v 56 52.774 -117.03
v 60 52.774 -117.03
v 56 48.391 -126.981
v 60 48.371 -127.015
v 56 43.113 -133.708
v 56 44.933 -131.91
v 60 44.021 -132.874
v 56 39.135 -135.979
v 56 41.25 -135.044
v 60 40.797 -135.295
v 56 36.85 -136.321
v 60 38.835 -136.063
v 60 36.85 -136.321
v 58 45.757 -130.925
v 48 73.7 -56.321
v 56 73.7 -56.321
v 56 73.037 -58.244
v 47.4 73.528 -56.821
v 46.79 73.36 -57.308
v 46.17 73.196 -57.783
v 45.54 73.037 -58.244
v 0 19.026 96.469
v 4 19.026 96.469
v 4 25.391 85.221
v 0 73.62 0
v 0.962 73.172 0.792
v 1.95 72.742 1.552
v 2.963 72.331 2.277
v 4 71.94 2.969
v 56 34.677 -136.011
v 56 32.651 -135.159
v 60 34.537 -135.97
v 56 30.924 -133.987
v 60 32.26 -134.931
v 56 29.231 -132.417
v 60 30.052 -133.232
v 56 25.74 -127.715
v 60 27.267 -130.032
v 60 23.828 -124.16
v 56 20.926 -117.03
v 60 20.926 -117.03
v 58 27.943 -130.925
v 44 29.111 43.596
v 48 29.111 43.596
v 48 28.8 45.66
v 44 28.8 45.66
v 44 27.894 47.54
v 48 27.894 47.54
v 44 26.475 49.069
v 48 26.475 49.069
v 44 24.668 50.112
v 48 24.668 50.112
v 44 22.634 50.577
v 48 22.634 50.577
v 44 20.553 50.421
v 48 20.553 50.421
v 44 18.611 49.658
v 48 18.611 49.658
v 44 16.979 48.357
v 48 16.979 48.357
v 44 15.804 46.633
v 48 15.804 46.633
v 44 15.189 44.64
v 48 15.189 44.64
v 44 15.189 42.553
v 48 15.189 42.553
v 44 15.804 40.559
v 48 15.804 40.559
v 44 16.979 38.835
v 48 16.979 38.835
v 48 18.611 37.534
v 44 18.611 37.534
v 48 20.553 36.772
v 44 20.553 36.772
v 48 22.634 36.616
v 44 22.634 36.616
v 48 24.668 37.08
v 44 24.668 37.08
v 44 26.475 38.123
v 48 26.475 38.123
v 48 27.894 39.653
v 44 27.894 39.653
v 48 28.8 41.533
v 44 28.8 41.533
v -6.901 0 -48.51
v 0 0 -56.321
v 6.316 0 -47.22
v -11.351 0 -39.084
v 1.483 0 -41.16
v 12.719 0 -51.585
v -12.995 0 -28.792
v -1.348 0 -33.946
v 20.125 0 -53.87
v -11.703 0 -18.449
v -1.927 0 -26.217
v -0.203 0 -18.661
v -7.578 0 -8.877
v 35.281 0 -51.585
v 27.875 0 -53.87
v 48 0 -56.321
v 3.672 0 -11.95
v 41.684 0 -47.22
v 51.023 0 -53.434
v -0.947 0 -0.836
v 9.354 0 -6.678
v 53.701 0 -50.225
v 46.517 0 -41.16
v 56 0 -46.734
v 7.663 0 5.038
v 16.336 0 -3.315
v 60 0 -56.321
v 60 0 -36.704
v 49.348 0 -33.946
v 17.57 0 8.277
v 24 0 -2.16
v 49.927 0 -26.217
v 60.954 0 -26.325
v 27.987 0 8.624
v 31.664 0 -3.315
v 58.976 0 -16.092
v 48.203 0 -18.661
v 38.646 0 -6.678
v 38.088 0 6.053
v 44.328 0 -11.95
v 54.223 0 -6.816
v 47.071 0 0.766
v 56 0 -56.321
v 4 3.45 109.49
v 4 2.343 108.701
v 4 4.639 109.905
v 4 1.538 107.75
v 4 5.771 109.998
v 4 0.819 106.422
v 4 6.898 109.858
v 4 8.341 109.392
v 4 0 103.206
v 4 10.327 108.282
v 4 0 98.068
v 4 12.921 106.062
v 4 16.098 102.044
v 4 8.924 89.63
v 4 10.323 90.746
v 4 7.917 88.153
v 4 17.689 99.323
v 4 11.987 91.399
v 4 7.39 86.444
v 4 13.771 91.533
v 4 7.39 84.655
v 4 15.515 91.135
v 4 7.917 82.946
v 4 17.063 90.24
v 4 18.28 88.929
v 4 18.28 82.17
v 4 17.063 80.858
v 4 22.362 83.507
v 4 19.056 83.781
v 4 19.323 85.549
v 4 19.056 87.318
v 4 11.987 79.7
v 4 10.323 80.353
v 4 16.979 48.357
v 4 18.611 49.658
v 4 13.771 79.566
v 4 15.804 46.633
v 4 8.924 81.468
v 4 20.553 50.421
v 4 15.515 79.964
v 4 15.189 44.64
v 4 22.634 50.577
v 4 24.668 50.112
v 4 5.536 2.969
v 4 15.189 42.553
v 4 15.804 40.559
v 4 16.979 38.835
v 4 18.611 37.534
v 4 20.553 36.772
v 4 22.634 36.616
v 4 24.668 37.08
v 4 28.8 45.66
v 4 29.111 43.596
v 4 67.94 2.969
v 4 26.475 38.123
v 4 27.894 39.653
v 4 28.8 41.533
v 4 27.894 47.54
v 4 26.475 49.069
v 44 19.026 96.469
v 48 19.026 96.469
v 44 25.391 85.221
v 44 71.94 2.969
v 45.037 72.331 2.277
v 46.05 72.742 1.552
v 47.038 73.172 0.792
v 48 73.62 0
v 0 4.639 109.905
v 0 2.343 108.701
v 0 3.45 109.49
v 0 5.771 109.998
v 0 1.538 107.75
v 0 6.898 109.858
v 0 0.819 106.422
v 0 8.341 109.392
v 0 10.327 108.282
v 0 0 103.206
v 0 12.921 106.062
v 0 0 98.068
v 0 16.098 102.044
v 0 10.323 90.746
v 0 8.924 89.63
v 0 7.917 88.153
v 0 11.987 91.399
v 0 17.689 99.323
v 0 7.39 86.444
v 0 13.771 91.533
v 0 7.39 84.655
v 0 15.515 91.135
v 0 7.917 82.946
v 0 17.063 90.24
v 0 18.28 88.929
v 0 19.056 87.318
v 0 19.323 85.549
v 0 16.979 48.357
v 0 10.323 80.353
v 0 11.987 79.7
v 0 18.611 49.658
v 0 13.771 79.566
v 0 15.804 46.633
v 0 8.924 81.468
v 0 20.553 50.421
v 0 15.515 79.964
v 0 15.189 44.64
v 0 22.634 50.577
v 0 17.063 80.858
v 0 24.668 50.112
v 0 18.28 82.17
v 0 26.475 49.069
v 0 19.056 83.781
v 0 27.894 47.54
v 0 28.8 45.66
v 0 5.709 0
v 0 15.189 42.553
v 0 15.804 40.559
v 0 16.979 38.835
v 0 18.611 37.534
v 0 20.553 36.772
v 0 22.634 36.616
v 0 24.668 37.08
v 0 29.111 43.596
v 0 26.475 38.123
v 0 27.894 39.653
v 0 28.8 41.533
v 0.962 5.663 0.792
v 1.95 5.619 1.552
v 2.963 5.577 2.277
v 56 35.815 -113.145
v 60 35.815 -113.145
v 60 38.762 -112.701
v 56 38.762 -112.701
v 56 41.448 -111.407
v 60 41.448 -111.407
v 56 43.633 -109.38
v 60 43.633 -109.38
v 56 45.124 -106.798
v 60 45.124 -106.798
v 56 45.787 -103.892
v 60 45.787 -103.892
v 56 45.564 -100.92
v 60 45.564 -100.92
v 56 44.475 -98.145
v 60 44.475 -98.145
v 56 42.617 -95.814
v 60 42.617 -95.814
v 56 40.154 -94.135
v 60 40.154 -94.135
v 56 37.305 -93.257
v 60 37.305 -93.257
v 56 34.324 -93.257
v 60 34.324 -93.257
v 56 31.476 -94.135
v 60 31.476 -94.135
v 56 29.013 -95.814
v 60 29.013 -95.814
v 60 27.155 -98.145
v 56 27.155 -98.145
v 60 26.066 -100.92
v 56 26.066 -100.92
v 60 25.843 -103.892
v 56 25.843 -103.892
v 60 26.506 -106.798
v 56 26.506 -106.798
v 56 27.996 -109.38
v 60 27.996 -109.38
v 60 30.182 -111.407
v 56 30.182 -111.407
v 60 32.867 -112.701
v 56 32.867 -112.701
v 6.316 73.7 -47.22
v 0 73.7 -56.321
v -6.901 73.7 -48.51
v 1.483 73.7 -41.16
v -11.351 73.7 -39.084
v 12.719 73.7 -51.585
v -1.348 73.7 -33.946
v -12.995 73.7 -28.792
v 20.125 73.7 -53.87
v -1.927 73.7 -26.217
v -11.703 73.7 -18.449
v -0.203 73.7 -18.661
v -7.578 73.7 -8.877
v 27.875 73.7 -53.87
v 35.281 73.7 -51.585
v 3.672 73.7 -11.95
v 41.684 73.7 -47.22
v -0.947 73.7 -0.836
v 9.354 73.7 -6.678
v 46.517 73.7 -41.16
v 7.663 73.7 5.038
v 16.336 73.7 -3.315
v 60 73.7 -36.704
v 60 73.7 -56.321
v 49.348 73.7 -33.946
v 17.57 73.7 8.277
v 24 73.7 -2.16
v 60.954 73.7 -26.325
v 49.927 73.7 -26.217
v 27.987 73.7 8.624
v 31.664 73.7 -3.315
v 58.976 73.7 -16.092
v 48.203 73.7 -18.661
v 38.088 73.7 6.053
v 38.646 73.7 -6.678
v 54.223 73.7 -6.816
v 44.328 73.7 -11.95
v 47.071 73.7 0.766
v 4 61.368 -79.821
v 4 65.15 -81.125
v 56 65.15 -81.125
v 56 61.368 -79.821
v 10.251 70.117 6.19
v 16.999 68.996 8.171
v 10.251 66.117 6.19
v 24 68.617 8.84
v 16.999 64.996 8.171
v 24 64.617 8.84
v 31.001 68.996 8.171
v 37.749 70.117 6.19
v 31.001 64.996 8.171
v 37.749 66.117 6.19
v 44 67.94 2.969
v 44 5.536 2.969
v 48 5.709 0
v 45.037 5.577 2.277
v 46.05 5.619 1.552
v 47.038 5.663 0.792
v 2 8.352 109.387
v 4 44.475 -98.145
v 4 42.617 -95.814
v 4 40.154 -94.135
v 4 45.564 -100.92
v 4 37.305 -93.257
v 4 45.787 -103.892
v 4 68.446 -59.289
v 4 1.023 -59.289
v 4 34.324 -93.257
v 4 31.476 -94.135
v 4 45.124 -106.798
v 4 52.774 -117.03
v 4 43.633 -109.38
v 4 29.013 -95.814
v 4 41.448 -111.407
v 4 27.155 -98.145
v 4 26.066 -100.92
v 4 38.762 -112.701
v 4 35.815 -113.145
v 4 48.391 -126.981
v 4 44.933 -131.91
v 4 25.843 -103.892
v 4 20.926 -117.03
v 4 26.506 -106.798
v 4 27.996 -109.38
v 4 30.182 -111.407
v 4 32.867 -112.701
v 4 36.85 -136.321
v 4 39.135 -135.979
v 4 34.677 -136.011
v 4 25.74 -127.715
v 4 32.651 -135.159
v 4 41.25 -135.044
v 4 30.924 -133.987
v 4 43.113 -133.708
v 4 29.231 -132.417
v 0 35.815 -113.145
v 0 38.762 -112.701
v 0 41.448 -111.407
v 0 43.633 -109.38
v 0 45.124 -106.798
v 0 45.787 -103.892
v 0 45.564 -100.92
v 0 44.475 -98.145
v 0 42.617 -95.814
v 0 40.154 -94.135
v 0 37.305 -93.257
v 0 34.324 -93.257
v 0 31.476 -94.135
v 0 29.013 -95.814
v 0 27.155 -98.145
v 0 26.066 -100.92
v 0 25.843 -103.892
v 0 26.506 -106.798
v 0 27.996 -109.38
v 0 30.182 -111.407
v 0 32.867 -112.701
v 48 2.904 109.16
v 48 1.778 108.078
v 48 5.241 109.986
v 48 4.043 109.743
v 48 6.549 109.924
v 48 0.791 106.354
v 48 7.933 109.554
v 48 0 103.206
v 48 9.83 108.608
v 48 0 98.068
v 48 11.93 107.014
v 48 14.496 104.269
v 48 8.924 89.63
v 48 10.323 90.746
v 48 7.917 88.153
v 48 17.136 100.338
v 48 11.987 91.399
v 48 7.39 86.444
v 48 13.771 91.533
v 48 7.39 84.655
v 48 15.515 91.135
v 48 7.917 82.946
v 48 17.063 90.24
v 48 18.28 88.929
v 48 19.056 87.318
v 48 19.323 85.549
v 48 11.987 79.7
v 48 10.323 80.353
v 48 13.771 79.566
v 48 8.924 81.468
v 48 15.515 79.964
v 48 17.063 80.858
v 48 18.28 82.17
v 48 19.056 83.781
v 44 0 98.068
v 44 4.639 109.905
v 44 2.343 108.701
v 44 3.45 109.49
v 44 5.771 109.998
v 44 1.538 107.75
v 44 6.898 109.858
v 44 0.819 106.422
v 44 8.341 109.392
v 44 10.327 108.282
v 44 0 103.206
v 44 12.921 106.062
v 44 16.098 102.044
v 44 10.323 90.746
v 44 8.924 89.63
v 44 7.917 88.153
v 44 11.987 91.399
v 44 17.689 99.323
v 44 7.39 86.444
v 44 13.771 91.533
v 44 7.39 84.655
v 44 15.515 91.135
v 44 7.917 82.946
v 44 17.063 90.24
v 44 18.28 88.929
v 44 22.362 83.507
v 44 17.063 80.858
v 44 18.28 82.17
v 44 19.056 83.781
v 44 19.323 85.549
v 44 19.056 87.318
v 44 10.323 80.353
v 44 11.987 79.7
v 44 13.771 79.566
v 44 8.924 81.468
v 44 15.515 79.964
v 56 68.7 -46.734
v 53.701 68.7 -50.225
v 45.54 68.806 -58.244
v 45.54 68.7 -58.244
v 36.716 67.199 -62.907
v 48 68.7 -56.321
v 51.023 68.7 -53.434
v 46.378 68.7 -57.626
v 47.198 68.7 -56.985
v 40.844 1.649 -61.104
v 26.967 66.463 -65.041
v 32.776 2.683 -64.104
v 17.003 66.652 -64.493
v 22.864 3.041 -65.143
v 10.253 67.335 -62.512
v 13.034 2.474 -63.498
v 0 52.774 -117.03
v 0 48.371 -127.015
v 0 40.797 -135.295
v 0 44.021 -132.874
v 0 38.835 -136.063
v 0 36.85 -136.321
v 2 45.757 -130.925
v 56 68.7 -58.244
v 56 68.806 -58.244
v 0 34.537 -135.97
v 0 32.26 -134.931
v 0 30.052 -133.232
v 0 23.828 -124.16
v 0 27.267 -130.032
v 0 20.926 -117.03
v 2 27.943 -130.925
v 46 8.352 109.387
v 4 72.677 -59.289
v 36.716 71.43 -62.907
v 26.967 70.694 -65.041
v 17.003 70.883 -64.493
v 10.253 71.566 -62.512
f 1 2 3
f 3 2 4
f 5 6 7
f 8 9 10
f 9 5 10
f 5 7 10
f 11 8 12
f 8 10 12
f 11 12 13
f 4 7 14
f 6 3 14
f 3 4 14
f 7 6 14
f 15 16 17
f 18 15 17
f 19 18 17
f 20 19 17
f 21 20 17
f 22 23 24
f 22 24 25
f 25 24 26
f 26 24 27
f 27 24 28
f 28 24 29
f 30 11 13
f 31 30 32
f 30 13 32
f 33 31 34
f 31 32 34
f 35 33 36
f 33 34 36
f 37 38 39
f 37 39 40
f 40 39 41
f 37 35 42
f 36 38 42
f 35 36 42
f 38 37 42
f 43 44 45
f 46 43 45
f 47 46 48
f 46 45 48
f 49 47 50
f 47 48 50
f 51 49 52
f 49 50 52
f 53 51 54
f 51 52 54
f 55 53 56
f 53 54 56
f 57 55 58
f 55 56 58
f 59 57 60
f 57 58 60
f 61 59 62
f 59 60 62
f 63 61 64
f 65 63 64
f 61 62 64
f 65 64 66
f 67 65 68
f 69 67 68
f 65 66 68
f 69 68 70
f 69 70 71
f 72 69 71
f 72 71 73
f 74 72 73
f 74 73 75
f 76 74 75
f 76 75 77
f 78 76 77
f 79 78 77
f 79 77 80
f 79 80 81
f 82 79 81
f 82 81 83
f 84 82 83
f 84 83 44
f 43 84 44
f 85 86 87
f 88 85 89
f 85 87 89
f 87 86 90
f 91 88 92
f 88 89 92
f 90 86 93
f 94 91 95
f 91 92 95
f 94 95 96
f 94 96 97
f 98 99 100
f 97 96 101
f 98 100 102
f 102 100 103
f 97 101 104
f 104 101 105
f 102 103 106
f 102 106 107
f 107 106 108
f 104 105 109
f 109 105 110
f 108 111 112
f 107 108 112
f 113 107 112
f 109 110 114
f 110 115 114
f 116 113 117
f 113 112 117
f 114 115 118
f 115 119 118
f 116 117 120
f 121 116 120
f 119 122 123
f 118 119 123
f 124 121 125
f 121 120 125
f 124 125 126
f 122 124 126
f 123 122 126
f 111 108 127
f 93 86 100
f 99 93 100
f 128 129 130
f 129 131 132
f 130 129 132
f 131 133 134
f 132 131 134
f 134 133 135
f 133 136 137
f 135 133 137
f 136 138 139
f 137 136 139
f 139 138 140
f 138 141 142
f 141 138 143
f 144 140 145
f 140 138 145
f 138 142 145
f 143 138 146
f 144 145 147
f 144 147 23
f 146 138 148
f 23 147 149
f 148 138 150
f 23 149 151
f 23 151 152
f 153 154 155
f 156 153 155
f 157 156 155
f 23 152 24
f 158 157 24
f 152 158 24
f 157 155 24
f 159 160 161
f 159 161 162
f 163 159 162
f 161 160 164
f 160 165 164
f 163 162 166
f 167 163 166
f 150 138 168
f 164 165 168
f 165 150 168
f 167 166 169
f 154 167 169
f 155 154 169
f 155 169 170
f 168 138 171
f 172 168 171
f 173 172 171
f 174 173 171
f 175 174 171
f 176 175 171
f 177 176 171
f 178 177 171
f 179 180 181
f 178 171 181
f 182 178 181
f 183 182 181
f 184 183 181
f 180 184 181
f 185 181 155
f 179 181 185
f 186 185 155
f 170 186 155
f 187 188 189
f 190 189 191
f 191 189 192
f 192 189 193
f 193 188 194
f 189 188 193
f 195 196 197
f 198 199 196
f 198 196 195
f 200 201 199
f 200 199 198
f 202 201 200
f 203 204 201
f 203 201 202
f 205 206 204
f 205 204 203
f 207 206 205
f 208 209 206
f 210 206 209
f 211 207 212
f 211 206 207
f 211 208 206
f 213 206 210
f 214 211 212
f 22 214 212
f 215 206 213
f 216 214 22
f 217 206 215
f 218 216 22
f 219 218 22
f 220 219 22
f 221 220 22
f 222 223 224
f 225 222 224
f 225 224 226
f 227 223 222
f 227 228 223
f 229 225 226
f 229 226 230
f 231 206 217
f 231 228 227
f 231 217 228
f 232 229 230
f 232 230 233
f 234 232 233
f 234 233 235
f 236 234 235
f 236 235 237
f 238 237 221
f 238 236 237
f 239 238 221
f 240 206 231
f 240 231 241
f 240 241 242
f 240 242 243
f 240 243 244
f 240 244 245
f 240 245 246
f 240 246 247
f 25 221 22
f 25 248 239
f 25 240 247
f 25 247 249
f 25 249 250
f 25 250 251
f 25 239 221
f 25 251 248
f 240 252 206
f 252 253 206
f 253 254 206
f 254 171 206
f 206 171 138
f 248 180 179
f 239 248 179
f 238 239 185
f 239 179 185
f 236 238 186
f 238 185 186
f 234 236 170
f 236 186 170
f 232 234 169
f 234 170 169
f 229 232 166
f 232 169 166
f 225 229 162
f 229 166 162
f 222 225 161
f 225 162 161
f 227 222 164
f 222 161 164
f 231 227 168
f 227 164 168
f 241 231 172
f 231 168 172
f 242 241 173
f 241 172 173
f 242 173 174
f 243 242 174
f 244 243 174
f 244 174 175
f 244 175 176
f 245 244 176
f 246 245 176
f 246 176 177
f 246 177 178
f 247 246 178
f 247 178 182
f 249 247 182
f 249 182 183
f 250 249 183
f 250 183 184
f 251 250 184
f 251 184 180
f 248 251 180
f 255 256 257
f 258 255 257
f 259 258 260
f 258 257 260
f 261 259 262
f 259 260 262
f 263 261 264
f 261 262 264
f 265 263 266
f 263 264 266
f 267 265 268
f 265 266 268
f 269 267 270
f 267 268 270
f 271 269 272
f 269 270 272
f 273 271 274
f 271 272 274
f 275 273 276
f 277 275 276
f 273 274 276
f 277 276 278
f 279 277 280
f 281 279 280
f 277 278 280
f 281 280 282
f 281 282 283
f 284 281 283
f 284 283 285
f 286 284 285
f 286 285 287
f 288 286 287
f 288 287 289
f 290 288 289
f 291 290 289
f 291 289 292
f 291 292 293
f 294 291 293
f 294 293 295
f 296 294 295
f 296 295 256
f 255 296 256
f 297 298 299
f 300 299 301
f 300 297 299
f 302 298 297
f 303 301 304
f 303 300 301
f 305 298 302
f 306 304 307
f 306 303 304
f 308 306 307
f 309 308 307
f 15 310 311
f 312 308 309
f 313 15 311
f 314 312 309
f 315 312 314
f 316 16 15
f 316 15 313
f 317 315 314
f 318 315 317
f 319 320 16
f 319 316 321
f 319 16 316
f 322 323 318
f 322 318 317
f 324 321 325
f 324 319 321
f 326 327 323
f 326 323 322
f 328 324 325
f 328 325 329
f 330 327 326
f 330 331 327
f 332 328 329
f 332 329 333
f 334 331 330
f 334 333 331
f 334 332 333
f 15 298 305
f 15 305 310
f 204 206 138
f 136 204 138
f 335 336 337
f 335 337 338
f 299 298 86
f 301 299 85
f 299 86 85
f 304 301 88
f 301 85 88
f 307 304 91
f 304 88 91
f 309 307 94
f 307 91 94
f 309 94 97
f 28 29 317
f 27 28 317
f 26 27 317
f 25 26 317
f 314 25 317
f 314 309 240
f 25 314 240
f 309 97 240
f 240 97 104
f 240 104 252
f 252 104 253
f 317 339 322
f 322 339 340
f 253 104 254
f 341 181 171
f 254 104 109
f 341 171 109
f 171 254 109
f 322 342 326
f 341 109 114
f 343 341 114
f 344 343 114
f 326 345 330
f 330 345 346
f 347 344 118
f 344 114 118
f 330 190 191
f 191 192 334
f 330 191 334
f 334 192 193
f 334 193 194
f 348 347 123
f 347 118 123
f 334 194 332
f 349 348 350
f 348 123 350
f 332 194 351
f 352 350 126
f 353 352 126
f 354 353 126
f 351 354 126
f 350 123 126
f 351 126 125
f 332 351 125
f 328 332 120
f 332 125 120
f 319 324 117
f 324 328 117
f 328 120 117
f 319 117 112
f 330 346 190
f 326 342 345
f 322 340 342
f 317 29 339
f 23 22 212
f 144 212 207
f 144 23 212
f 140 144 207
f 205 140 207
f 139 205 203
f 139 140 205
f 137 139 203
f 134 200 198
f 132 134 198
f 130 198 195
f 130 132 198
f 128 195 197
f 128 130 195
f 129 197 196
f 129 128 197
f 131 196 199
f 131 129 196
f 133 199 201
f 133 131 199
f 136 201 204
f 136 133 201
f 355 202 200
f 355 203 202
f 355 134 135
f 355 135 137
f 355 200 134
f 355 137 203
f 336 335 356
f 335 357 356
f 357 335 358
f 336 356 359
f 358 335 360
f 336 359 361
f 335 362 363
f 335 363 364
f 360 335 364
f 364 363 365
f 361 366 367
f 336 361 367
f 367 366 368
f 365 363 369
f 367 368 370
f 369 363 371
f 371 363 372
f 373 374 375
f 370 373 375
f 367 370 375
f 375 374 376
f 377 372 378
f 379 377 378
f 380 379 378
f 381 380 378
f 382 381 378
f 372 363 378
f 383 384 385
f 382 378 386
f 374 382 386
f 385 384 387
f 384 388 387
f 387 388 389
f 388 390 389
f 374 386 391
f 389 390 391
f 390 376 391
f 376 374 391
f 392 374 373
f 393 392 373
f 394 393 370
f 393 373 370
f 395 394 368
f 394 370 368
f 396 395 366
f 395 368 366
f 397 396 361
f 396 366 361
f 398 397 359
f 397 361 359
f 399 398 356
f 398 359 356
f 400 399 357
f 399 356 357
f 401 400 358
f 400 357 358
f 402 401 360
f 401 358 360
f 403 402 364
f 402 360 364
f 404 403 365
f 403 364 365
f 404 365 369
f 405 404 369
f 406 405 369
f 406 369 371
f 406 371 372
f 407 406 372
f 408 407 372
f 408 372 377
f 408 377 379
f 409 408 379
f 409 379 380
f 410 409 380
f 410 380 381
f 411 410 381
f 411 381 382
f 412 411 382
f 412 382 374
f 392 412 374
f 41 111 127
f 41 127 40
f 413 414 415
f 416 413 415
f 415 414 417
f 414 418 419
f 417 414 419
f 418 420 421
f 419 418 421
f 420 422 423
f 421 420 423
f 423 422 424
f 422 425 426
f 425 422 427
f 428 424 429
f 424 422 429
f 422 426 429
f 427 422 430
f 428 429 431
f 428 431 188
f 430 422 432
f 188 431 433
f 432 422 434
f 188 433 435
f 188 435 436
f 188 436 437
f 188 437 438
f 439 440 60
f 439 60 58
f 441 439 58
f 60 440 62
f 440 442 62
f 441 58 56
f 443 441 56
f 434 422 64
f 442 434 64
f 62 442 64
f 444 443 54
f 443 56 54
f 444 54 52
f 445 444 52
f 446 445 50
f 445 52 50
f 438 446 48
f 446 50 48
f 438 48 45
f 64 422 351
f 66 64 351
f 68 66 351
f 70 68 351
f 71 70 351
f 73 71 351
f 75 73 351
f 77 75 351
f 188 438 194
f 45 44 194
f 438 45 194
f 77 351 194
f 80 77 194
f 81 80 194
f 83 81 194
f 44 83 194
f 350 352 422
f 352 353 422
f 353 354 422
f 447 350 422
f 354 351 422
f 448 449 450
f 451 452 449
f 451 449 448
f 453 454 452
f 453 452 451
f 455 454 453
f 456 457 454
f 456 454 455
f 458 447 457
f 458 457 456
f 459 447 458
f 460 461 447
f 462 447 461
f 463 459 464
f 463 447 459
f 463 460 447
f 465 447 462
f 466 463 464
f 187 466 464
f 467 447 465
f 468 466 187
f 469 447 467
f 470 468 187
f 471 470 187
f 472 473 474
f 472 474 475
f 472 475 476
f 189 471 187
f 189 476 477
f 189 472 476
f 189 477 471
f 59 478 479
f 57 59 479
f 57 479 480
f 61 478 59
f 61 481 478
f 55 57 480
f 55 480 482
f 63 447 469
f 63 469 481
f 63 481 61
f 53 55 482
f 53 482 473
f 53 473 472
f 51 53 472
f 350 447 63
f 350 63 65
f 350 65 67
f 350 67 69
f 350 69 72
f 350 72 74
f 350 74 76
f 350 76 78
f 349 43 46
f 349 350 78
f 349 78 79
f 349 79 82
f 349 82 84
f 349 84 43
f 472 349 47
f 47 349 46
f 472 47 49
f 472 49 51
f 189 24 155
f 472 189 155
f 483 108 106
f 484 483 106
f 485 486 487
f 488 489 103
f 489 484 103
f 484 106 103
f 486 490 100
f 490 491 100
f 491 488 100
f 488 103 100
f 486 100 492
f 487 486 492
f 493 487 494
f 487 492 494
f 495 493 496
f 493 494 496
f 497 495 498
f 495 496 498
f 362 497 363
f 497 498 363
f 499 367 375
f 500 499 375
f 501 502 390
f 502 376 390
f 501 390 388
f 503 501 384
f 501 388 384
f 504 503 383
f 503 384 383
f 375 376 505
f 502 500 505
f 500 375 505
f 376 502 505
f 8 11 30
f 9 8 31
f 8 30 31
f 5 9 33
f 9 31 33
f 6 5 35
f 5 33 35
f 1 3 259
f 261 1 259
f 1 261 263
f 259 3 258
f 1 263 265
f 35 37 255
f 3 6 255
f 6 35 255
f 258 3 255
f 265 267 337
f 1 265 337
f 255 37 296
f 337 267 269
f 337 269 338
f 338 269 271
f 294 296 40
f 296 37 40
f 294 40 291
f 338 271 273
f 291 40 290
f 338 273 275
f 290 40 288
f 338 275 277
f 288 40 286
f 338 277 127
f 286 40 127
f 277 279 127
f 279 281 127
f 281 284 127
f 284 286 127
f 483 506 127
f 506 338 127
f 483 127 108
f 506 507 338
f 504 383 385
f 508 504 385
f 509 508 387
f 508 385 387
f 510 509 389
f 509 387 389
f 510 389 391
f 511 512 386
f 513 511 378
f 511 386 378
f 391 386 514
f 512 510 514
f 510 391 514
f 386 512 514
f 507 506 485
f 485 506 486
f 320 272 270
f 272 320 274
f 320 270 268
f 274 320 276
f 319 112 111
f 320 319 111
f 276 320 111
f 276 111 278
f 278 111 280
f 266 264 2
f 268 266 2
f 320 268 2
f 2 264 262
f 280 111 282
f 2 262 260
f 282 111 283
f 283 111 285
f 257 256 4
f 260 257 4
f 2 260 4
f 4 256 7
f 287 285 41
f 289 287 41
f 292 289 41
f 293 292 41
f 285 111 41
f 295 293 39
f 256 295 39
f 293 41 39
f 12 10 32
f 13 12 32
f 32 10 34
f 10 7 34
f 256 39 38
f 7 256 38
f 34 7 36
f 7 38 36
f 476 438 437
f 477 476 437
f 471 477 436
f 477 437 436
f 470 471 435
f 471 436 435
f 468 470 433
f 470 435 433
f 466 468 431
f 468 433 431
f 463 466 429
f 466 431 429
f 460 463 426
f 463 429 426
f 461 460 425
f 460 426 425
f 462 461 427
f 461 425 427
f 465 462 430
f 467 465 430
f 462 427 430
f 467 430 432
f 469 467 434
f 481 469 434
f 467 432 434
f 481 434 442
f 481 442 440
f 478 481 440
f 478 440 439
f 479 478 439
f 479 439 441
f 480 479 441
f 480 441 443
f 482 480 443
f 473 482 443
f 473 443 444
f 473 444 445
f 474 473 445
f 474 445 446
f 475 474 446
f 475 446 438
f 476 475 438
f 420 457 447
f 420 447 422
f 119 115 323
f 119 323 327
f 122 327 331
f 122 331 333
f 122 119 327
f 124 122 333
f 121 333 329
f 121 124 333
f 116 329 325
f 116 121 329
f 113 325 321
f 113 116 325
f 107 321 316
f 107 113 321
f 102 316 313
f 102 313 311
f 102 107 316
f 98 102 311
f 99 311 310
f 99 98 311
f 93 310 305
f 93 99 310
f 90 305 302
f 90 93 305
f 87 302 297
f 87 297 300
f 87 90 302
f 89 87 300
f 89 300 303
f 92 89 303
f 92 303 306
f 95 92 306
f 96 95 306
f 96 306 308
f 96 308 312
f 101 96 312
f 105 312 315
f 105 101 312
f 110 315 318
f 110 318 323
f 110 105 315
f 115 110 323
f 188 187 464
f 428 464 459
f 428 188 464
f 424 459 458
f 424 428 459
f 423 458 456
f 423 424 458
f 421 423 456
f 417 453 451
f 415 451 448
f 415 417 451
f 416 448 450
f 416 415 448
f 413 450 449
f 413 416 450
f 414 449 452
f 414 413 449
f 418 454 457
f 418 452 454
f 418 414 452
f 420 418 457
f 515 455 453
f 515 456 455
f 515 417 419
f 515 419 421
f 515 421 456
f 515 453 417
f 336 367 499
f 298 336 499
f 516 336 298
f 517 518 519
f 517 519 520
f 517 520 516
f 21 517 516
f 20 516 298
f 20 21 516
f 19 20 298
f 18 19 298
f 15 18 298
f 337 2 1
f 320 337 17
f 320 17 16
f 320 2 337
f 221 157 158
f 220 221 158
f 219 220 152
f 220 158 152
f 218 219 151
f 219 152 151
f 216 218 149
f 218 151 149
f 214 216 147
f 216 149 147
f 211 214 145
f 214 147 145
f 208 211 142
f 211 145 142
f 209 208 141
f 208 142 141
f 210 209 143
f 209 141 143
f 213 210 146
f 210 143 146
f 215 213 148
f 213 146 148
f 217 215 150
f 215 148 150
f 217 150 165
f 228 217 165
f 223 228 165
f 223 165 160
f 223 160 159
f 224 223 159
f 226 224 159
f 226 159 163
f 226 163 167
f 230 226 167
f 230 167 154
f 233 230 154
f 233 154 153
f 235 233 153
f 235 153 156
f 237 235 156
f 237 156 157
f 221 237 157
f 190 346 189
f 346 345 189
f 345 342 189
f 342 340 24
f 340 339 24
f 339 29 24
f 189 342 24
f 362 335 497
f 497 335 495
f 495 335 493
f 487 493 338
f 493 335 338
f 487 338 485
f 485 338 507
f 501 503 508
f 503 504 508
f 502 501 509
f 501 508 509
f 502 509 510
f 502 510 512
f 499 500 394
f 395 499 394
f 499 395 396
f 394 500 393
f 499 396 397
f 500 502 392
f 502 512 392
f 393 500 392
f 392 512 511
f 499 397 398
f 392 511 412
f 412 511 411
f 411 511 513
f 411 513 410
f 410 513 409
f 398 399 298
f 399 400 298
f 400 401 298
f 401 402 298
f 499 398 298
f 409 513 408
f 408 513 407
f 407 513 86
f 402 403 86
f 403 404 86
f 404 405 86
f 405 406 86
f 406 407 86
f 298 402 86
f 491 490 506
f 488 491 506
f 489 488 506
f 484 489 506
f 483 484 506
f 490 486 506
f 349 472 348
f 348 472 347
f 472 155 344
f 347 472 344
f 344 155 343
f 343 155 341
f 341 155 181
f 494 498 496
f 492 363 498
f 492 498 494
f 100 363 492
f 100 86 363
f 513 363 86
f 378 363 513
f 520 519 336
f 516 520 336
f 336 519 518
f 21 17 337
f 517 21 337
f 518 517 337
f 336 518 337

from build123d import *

# Parameters (mm, degrees)
SKETCH3_W                = 4
SKETCH3_H                = 73.62
BOSS_EXTRUDE2_DEPTH      = 110
BOSS_EXTRUDE2_2_DEPTH    = 110
SKETCH4_OUTSIDE_W        = 140.16
SKETCH4_OUTSIDE_H        = 103.78
CUT_EXTRUDE1_DEPTH       = 110
BOSS_EXTRUDE3_DEPTH      = 40
SKETCH6_R                = 7
SKETCH6_R_2              = 6
CUT_EXTRUDE2_DEPTH       = 110
SKETCH7_R                = 37
SKETCH7_R_2              = 26
BOSS_EXTRUDE4_DEPTH      = 73.7
BOSS_EXTRUDE6_START      = -73.7
BOSS_EXTRUDE6_DEPTH      = 73.7
CUT_EXTRUDE9_START       = -60
CUT_EXTRUDE9_DEPTH       = 60
SKETCH15_R               = 10
CUT_EXTRUDE11_DEPTH      = 74
BOSS_EXTRUDE8_REACH      = 171.943
CUT_EXTRUDE12_DEPTH      = 172.60636515
CUT_EXTRUDE12_DEPTH_BACK = 172.60636515
SKETCH18_W               = 0.383748065
SKETCH18_H               = 73.7
BOSS_EXTRUDE9_START      = -5
BOSS_EXTRUDE9_DEPTH      = 5
CUT_EXTRUDE13_DEPTH      = 50


# Read off the part's stored shape, not the designer's step: Cut-Extrude9
with BuildPart() as part:
    # Sketch3 → Boss-Extrude2 (new body)
    with BuildSketch(Plane.XY):
        with Locations((2, 36.81)):
            Rectangle(SKETCH3_W, SKETCH3_H)
    extrude(amount=BOSS_EXTRUDE2_DEPTH)


with BuildPart() as body_2:
    # Sketch3 → Boss-Extrude2 2 (new body)
    with BuildSketch(Plane.XY):
        with Locations((46, 36.81)):
            Rectangle(SKETCH3_W, SKETCH3_H)
    extrude(amount=BOSS_EXTRUDE2_2_DEPTH)


with BuildPart() as cut_extrude1_tool:
    # Sketch4 outside → Cut-Extrude1 (new body)
    with BuildSketch(Plane(origin=(48, 0, 0), x_dir=(0, 0, -1), z_dir=(1, 0, 0))):
        with Locations((-55, 36.81)):
            Rectangle(SKETCH4_OUTSIDE_W, SKETCH4_OUTSIDE_H)
        with BuildLine():
            Line((0, 5.709271206), (-99.676636629, -0.093636173))
            add(Edge.make_bspline(
                [(-96.468976077, 19.025739265), (-149.450115124, -2.991315062), (-99.676636629, -0.093636173)],
                knots=[1.570796327, 1.570796327, 1.570796327, 4.103862701, 4.103862701, 4.103862701], degree=2, weights=[1, 0.299590242, 1]))
            Line((-96.468976077, 19.025739265), (0, 73.62))
            Line((0, 73.62), (0, 5.709271206))
        make_face(mode=Mode.SUBTRACT)
    extrude(amount=-CUT_EXTRUDE1_DEPTH)


with BuildPart() as part_1:
    add(part.part)

    # Cut-Extrude1: cut by cut_extrude1_tool
    add(cut_extrude1_tool.part, mode=Mode.SUBTRACT)



with BuildPart() as body_2_1:
    add(body_2.part)

    # Cut-Extrude1: cut by cut_extrude1_tool
    add(cut_extrude1_tool.part, mode=Mode.SUBTRACT)


with BuildPart() as part_2:
    add(part_1.part)

    add(body_2_1.part)  # Boss-Extrude3 merges body 2
    # Sketch5 → Boss-Extrude3 (add)
    with BuildSketch(Plane(origin=(4, 0, 0), x_dir=(0, 0, -1), z_dir=(1, 0, 0))):
        Polygon((0, 73.62), (-85.221110514, 25.391194049), (-83.506537519, 22.361514757), (0, 69.62), align=None)
    extrude(amount=BOSS_EXTRUDE3_DEPTH)

    # Sketch6 → Cut-Extrude2 (cut)
    with BuildSketch(Plane(origin=(48, 0, 0), x_dir=(0, 0, -1), z_dir=(1, 0, 0))):
        with Locations(Location((-43.596276135, 22.110704559, 0), (0, 0, 90))):
            Circle(SKETCH6_R)
        with Locations(Location((-85.5494254, 13.322513691, 0), (0, 0, 90))):
            Circle(SKETCH6_R_2)
    extrude(amount=-CUT_EXTRUDE2_DEPTH, mode=Mode.SUBTRACT)

    # Sketch7 → Boss-Extrude4 (add)
    with BuildSketch(Plane(origin=(0, 0, 0), x_dir=(1, 0, 0), z_dir=(0, 1, 0))):
        with Locations(Location((24, 28.160255681, 0), (0, 0, 270))):
            Circle(SKETCH7_R)
        with Locations(Location((24, 28.160255681, 0), (0, 0, 270))):
            Circle(SKETCH7_R_2, mode=Mode.SUBTRACT)
    extrude(amount=BOSS_EXTRUDE4_DEPTH)

    # Sketch9 → Boss-Extrude6 (add)
    with BuildSketch(Plane(origin=(0, 73.7, 0), x_dir=(1, 0, 0), z_dir=(0, 1, 0)).offset(BOSS_EXTRUDE6_START)):
        with BuildLine():
            ThreePointArc((56, 46.734431302), (58.367878709, 41.866054199), (60, 36.704259426))
            Line((60, 36.704259426), (60, 136.704259426))
            Line((60, 136.704259426), (56, 136.704259426))
            Line((56, 136.704259426), (56, 46.734431302))
        make_face()
        with BuildLine():
            Line((0, 136.320511361), (0, 56.320511361))
            ThreePointArc((0, 56.320511361), (1.949988398, 57.872155458), (4, 59.289020513))
            Line((4, 59.289020513), (4, 136.320511361))
            Line((4, 136.320511361), (0, 136.320511361))
        make_face()
    extrude(amount=BOSS_EXTRUDE6_DEPTH)

    # Cut-Extrude9 outline → Cut-Extrude9 (cut)
    with BuildSketch(Plane.ZY.offset(CUT_EXTRUDE9_START)):
        with BuildLine():
            add(Edge.make_bspline(
                [(-136.320511361, 36.85), (-136.320511361, 27.575850811), (-117.029991726, 20.926444667)],
                knots=[6.283185307, 6.283185307, 6.283185307, 7.054517173, 7.054517173, 7.054517173], degree=2, weights=[0.858491437, 0.858491437, 1]))
            Line((-136.320511361, 36.85), (-136.320511361, 0))
            Line((-136.320511361, 0), (-56.320511361, 0))
            Line((-56.320511361, 0), (-117.029991726, 20.926444667))
        make_face()
        with BuildLine():
            add(Edge.make_bspline(
                [(-117.029991726, 52.773555333), (-136.320511361, 46.124149189), (-136.320511361, 36.85)],
                knots=[5.511853442, 5.511853442, 5.511853442, 6.283185307, 6.283185307, 6.283185307], degree=2, weights=[1, 0.858491437, 0.858491437]))
            Line((-117.029991726, 52.773555333), (-56.320511361, 73.7))
            Line((-56.320511361, 73.7), (-136.320511361, 73.7))
            Line((-136.320511361, 73.7), (-136.320511361, 36.85))
        make_face()
    extrude(amount=CUT_EXTRUDE9_DEPTH, mode=Mode.SUBTRACT)

    # Sketch15 → Cut-Extrude11 (cut)
    with BuildSketch(Plane(origin=(60, 0, 0), x_dir=(0, 0, -1), z_dir=(1, 0, 0))):
        with Locations((103.144942626, 35.814780524)):
            Circle(SKETCH15_R)
    extrude(amount=-CUT_EXTRUDE11_DEPTH, mode=Mode.SUBTRACT)

    # Boss-Extrude8: up to this face of the body (flat: up to its plane)
    boss_extrude8_end = Plane(part_2.part.faces().sort_by_distance((4, 36.955026581, -88.076596364))[0])
    # Sketch16 → Boss-Extrude8 (add, up to the picked face)
    with BuildSketch(Plane.ZY.offset(-56), mode=Mode.PRIVATE) as boss_extrude8_sk1:
        Polygon((-58.244155034, 73.036923613), (-81.124851518, 65.149990205), (-79.821326308, 61.368347436), (-58.244155034, 68.805958136), align=None)
    boss_extrude8_tool1 = split(extrude(boss_extrude8_sk1.sketch, amount=BOSS_EXTRUDE8_REACH, mode=Mode.PRIVATE), bisect_by=boss_extrude8_end, keep=Keep.BOTH, mode=Mode.PRIVATE)
    add(boss_extrude8_tool1.solids().sort_by(Axis((56, 67.109883, -69.361807), (-1, 0, 0)))[0])

    # Sketch18 → Cut-Extrude12 (cut, two sides: drawn at the far end of the back side and taken through both)
    with BuildSketch(Plane(origin=(60, 0, 0), x_dir=(0, 0, -1), z_dir=(1, 0, 0)).offset(-CUT_EXTRUDE12_DEPTH_BACK)):
        with Locations((136.512385394, 36.85)):
            Rectangle(SKETCH18_W, SKETCH18_H)
    extrude(amount=CUT_EXTRUDE12_DEPTH + CUT_EXTRUDE12_DEPTH_BACK, mode=Mode.SUBTRACT)

    # Sketch19 → Boss-Extrude9 (add)
    with BuildSketch(Plane(origin=(0, 73.7, 0), x_dir=(1, 0, 0), z_dir=(0, 1, 0)).offset(BOSS_EXTRUDE9_START)):
        with BuildLine():
            Line((56, 56.320511361), (56, 58.244155034))
            Line((56, 58.244155034), (45.539707511, 58.244155034))
            ThreePointArc((45.539707511, 58.244155034), (46.79015887, 57.308302934), (48, 56.320511361))
            ThreePointArc((48, 56.320511361), (52.407274292, 51.867359411), (56, 46.734431302))
            Line((56, 46.734431302), (56, 56.320511361))
        make_face()
    extrude(amount=BOSS_EXTRUDE9_DEPTH)

    # Sketch20 → Cut-Extrude13 (cut)
    with BuildSketch(Plane(origin=(60, 0, 0), x_dir=(0, 0, -1), z_dir=(1, 0, 0))):
        Polygon((58.244155034, 73.036923613), (58.244155034, 73.7), (56.320511361, 73.7), align=None)
    extrude(amount=-CUT_EXTRUDE13_DEPTH, mode=Mode.SUBTRACT)


solid = part_2.part
